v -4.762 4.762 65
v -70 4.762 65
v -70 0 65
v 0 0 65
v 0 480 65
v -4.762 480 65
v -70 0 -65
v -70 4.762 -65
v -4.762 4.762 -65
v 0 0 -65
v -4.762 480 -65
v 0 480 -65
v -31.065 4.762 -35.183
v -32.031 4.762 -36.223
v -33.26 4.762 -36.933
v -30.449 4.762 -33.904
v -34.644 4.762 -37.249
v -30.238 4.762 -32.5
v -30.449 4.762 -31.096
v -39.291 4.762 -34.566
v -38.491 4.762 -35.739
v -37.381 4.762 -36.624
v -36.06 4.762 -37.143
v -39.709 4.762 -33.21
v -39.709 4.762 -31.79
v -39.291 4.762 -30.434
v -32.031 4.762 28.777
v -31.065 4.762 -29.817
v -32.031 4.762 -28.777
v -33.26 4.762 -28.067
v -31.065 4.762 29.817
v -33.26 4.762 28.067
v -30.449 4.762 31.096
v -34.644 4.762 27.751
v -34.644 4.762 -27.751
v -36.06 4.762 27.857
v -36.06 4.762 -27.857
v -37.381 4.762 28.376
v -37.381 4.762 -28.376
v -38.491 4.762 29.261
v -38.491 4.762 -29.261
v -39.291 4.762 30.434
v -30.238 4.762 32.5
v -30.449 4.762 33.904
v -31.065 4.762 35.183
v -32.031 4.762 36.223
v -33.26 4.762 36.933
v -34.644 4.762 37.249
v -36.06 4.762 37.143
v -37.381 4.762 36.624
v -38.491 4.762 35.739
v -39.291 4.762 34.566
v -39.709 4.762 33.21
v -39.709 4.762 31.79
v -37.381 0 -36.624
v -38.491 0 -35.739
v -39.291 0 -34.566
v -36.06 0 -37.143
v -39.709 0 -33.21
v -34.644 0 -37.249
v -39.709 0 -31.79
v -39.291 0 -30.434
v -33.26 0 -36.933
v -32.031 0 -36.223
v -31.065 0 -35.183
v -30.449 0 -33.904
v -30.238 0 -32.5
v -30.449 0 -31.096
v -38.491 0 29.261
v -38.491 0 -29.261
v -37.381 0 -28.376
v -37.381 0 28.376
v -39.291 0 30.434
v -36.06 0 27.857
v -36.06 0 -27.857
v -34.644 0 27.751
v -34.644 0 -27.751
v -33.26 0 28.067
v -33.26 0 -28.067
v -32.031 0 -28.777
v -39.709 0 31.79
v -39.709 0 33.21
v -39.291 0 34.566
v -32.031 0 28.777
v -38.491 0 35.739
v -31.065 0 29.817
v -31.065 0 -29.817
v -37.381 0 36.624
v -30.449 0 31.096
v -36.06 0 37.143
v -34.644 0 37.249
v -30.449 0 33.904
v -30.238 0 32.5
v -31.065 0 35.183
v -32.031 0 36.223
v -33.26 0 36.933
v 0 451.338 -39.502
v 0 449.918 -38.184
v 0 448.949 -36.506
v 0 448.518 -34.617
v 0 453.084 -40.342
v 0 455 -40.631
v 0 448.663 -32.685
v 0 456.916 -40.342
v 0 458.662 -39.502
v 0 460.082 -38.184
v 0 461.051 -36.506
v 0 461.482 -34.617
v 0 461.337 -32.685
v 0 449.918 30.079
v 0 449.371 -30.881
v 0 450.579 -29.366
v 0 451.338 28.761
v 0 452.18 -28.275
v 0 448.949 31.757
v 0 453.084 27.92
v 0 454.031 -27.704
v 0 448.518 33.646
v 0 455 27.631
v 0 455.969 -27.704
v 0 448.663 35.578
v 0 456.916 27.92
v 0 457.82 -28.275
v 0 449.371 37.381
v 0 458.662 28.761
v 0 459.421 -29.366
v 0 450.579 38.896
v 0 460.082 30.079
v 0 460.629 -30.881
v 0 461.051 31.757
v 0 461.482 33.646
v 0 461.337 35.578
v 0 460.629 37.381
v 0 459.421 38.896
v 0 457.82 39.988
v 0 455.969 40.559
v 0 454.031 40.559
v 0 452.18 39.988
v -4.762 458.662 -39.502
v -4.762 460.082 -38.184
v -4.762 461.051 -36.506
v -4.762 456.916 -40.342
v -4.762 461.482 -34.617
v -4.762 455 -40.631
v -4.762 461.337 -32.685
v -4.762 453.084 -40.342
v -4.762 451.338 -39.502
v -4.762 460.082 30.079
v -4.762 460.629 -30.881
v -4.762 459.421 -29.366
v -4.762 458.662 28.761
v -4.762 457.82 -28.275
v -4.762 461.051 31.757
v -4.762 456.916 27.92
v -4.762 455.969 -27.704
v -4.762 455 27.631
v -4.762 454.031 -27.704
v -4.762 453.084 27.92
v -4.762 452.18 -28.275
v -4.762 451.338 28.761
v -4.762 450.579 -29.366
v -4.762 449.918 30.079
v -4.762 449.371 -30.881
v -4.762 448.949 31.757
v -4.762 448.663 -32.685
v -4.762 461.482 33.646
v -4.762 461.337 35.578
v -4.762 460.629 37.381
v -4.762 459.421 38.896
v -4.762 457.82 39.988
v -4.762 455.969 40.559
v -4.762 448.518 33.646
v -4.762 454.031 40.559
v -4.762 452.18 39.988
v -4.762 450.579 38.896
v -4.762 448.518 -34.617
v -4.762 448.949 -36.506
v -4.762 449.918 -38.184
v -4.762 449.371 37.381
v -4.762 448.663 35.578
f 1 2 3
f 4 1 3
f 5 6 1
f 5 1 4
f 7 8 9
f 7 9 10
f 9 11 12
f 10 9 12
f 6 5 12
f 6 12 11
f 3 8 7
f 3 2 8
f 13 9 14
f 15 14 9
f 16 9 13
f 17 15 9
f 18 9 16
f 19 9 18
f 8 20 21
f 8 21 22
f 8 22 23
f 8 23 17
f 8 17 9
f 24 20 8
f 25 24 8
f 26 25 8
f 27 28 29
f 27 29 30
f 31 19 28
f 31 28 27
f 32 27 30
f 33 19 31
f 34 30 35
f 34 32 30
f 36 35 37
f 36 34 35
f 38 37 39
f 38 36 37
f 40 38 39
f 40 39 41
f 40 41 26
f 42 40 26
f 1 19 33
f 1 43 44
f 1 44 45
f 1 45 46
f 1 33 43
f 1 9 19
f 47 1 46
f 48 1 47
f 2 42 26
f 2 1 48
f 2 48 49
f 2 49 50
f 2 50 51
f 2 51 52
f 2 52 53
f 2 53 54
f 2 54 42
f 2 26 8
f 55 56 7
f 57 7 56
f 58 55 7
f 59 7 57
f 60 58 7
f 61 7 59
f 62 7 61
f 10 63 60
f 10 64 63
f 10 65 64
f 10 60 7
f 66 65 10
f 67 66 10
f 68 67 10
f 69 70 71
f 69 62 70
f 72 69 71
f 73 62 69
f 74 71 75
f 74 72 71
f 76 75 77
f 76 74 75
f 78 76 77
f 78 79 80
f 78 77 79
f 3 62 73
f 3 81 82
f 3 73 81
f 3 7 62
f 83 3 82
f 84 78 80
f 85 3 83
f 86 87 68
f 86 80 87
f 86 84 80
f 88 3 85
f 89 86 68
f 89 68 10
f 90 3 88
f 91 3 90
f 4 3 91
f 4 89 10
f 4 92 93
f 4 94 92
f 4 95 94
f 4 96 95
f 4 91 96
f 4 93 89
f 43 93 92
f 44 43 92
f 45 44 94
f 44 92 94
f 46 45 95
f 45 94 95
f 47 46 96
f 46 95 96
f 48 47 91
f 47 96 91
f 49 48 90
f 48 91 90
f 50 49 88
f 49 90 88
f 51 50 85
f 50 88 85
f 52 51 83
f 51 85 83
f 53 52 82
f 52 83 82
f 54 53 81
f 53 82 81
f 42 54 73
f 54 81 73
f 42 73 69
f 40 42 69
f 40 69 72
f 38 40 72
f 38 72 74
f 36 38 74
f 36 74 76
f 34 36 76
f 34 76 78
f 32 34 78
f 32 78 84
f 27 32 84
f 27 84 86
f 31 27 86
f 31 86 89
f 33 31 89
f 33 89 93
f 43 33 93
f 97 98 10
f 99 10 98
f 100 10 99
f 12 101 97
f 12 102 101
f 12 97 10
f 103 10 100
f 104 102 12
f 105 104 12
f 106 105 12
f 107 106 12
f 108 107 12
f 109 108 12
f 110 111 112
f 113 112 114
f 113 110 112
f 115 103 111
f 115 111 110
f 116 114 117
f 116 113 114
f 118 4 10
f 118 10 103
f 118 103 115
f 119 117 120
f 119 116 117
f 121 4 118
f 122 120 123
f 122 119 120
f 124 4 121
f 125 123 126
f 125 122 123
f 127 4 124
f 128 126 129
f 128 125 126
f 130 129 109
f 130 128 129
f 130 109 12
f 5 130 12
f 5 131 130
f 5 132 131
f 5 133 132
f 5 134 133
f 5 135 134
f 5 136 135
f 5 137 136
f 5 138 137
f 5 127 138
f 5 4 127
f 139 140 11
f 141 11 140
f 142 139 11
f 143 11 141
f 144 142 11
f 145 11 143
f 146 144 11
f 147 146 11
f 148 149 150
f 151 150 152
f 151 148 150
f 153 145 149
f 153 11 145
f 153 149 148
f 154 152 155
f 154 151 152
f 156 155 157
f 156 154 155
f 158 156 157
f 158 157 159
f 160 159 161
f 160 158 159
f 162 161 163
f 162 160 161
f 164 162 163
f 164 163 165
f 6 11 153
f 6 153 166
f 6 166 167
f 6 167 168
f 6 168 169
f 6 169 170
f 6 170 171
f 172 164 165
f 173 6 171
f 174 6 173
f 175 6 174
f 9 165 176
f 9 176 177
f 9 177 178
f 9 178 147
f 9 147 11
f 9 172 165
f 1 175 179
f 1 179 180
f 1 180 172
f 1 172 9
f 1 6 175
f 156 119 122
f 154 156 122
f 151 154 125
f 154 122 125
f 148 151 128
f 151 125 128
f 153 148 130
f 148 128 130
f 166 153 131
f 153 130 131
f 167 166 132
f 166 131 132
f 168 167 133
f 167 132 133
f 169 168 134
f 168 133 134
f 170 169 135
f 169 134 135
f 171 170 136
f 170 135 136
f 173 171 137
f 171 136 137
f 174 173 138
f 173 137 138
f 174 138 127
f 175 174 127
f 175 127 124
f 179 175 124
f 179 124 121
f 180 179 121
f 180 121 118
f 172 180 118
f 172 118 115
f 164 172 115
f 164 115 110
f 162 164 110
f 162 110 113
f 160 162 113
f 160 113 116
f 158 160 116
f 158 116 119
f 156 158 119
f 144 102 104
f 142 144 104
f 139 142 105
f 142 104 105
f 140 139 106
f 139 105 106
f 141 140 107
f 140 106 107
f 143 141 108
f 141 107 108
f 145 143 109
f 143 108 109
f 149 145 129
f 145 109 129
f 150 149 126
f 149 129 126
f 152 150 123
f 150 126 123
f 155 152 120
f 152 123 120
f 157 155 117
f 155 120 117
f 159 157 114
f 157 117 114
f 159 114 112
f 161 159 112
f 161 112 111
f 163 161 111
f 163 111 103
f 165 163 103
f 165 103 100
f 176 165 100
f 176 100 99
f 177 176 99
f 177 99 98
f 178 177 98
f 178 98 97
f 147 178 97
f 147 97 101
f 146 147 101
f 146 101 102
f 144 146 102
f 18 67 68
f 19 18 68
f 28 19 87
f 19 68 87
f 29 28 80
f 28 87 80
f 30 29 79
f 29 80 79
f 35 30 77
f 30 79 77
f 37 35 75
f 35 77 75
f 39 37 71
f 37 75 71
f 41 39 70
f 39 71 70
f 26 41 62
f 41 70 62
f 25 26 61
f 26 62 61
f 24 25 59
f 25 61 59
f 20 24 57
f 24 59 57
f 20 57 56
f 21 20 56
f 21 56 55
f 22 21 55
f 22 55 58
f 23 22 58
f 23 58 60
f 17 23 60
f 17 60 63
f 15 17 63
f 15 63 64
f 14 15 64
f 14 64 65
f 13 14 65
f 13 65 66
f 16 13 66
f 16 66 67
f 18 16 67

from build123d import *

# Parameters (mm, degrees)
SALIENTE_EXTRUIR1_DEPTH = 65
CROQUIS2_R              = 4.7625
CORTAR_EXTRUIR1_DEPTH   = 130
CROQUIS3_R              = 6.5
CORTAR_EXTRUIR2_DEPTH   = 130


with BuildPart() as part:
    # Croquis1 → Saliente-Extruir1 (new, symmetric)
    with BuildSketch(Plane.XY):
        Polygon((0, 0), (0, 480), (-4.7625, 480), (-4.7625, 4.7625), (-70, 4.7625), (-70, 0), align=None)
    extrude(amount=SALIENTE_EXTRUIR1_DEPTH, both=True)

    # Croquis2 → Cortar-Extruir1 (cut)
    with BuildSketch(Plane(origin=(0, 0, 0), x_dir=(-1, 0, 0), z_dir=(0, -1, 0))):
        with Locations(Location((35, -32.5, 0), (0, 0, 180))):
            Circle(CROQUIS2_R)
        with Locations(Location((35, 32.5, 0), (0, 0, 180))):
            Circle(CROQUIS2_R)
    extrude(amount=-CORTAR_EXTRUIR1_DEPTH, mode=Mode.SUBTRACT)

    # Croquis3 → Cortar-Extruir2 (cut)
    with BuildSketch(Plane(origin=(0, 0, 0), x_dir=(0, 0, -1), z_dir=(1, 0, 0))):
        with Locations((-34.13125, 455)):
            Circle(CROQUIS3_R)
        with Locations((34.13125, 455)):
            Circle(CROQUIS3_R)
    extrude(amount=-CORTAR_EXTRUIR2_DEPTH, mode=Mode.SUBTRACT)


solid = part.part
